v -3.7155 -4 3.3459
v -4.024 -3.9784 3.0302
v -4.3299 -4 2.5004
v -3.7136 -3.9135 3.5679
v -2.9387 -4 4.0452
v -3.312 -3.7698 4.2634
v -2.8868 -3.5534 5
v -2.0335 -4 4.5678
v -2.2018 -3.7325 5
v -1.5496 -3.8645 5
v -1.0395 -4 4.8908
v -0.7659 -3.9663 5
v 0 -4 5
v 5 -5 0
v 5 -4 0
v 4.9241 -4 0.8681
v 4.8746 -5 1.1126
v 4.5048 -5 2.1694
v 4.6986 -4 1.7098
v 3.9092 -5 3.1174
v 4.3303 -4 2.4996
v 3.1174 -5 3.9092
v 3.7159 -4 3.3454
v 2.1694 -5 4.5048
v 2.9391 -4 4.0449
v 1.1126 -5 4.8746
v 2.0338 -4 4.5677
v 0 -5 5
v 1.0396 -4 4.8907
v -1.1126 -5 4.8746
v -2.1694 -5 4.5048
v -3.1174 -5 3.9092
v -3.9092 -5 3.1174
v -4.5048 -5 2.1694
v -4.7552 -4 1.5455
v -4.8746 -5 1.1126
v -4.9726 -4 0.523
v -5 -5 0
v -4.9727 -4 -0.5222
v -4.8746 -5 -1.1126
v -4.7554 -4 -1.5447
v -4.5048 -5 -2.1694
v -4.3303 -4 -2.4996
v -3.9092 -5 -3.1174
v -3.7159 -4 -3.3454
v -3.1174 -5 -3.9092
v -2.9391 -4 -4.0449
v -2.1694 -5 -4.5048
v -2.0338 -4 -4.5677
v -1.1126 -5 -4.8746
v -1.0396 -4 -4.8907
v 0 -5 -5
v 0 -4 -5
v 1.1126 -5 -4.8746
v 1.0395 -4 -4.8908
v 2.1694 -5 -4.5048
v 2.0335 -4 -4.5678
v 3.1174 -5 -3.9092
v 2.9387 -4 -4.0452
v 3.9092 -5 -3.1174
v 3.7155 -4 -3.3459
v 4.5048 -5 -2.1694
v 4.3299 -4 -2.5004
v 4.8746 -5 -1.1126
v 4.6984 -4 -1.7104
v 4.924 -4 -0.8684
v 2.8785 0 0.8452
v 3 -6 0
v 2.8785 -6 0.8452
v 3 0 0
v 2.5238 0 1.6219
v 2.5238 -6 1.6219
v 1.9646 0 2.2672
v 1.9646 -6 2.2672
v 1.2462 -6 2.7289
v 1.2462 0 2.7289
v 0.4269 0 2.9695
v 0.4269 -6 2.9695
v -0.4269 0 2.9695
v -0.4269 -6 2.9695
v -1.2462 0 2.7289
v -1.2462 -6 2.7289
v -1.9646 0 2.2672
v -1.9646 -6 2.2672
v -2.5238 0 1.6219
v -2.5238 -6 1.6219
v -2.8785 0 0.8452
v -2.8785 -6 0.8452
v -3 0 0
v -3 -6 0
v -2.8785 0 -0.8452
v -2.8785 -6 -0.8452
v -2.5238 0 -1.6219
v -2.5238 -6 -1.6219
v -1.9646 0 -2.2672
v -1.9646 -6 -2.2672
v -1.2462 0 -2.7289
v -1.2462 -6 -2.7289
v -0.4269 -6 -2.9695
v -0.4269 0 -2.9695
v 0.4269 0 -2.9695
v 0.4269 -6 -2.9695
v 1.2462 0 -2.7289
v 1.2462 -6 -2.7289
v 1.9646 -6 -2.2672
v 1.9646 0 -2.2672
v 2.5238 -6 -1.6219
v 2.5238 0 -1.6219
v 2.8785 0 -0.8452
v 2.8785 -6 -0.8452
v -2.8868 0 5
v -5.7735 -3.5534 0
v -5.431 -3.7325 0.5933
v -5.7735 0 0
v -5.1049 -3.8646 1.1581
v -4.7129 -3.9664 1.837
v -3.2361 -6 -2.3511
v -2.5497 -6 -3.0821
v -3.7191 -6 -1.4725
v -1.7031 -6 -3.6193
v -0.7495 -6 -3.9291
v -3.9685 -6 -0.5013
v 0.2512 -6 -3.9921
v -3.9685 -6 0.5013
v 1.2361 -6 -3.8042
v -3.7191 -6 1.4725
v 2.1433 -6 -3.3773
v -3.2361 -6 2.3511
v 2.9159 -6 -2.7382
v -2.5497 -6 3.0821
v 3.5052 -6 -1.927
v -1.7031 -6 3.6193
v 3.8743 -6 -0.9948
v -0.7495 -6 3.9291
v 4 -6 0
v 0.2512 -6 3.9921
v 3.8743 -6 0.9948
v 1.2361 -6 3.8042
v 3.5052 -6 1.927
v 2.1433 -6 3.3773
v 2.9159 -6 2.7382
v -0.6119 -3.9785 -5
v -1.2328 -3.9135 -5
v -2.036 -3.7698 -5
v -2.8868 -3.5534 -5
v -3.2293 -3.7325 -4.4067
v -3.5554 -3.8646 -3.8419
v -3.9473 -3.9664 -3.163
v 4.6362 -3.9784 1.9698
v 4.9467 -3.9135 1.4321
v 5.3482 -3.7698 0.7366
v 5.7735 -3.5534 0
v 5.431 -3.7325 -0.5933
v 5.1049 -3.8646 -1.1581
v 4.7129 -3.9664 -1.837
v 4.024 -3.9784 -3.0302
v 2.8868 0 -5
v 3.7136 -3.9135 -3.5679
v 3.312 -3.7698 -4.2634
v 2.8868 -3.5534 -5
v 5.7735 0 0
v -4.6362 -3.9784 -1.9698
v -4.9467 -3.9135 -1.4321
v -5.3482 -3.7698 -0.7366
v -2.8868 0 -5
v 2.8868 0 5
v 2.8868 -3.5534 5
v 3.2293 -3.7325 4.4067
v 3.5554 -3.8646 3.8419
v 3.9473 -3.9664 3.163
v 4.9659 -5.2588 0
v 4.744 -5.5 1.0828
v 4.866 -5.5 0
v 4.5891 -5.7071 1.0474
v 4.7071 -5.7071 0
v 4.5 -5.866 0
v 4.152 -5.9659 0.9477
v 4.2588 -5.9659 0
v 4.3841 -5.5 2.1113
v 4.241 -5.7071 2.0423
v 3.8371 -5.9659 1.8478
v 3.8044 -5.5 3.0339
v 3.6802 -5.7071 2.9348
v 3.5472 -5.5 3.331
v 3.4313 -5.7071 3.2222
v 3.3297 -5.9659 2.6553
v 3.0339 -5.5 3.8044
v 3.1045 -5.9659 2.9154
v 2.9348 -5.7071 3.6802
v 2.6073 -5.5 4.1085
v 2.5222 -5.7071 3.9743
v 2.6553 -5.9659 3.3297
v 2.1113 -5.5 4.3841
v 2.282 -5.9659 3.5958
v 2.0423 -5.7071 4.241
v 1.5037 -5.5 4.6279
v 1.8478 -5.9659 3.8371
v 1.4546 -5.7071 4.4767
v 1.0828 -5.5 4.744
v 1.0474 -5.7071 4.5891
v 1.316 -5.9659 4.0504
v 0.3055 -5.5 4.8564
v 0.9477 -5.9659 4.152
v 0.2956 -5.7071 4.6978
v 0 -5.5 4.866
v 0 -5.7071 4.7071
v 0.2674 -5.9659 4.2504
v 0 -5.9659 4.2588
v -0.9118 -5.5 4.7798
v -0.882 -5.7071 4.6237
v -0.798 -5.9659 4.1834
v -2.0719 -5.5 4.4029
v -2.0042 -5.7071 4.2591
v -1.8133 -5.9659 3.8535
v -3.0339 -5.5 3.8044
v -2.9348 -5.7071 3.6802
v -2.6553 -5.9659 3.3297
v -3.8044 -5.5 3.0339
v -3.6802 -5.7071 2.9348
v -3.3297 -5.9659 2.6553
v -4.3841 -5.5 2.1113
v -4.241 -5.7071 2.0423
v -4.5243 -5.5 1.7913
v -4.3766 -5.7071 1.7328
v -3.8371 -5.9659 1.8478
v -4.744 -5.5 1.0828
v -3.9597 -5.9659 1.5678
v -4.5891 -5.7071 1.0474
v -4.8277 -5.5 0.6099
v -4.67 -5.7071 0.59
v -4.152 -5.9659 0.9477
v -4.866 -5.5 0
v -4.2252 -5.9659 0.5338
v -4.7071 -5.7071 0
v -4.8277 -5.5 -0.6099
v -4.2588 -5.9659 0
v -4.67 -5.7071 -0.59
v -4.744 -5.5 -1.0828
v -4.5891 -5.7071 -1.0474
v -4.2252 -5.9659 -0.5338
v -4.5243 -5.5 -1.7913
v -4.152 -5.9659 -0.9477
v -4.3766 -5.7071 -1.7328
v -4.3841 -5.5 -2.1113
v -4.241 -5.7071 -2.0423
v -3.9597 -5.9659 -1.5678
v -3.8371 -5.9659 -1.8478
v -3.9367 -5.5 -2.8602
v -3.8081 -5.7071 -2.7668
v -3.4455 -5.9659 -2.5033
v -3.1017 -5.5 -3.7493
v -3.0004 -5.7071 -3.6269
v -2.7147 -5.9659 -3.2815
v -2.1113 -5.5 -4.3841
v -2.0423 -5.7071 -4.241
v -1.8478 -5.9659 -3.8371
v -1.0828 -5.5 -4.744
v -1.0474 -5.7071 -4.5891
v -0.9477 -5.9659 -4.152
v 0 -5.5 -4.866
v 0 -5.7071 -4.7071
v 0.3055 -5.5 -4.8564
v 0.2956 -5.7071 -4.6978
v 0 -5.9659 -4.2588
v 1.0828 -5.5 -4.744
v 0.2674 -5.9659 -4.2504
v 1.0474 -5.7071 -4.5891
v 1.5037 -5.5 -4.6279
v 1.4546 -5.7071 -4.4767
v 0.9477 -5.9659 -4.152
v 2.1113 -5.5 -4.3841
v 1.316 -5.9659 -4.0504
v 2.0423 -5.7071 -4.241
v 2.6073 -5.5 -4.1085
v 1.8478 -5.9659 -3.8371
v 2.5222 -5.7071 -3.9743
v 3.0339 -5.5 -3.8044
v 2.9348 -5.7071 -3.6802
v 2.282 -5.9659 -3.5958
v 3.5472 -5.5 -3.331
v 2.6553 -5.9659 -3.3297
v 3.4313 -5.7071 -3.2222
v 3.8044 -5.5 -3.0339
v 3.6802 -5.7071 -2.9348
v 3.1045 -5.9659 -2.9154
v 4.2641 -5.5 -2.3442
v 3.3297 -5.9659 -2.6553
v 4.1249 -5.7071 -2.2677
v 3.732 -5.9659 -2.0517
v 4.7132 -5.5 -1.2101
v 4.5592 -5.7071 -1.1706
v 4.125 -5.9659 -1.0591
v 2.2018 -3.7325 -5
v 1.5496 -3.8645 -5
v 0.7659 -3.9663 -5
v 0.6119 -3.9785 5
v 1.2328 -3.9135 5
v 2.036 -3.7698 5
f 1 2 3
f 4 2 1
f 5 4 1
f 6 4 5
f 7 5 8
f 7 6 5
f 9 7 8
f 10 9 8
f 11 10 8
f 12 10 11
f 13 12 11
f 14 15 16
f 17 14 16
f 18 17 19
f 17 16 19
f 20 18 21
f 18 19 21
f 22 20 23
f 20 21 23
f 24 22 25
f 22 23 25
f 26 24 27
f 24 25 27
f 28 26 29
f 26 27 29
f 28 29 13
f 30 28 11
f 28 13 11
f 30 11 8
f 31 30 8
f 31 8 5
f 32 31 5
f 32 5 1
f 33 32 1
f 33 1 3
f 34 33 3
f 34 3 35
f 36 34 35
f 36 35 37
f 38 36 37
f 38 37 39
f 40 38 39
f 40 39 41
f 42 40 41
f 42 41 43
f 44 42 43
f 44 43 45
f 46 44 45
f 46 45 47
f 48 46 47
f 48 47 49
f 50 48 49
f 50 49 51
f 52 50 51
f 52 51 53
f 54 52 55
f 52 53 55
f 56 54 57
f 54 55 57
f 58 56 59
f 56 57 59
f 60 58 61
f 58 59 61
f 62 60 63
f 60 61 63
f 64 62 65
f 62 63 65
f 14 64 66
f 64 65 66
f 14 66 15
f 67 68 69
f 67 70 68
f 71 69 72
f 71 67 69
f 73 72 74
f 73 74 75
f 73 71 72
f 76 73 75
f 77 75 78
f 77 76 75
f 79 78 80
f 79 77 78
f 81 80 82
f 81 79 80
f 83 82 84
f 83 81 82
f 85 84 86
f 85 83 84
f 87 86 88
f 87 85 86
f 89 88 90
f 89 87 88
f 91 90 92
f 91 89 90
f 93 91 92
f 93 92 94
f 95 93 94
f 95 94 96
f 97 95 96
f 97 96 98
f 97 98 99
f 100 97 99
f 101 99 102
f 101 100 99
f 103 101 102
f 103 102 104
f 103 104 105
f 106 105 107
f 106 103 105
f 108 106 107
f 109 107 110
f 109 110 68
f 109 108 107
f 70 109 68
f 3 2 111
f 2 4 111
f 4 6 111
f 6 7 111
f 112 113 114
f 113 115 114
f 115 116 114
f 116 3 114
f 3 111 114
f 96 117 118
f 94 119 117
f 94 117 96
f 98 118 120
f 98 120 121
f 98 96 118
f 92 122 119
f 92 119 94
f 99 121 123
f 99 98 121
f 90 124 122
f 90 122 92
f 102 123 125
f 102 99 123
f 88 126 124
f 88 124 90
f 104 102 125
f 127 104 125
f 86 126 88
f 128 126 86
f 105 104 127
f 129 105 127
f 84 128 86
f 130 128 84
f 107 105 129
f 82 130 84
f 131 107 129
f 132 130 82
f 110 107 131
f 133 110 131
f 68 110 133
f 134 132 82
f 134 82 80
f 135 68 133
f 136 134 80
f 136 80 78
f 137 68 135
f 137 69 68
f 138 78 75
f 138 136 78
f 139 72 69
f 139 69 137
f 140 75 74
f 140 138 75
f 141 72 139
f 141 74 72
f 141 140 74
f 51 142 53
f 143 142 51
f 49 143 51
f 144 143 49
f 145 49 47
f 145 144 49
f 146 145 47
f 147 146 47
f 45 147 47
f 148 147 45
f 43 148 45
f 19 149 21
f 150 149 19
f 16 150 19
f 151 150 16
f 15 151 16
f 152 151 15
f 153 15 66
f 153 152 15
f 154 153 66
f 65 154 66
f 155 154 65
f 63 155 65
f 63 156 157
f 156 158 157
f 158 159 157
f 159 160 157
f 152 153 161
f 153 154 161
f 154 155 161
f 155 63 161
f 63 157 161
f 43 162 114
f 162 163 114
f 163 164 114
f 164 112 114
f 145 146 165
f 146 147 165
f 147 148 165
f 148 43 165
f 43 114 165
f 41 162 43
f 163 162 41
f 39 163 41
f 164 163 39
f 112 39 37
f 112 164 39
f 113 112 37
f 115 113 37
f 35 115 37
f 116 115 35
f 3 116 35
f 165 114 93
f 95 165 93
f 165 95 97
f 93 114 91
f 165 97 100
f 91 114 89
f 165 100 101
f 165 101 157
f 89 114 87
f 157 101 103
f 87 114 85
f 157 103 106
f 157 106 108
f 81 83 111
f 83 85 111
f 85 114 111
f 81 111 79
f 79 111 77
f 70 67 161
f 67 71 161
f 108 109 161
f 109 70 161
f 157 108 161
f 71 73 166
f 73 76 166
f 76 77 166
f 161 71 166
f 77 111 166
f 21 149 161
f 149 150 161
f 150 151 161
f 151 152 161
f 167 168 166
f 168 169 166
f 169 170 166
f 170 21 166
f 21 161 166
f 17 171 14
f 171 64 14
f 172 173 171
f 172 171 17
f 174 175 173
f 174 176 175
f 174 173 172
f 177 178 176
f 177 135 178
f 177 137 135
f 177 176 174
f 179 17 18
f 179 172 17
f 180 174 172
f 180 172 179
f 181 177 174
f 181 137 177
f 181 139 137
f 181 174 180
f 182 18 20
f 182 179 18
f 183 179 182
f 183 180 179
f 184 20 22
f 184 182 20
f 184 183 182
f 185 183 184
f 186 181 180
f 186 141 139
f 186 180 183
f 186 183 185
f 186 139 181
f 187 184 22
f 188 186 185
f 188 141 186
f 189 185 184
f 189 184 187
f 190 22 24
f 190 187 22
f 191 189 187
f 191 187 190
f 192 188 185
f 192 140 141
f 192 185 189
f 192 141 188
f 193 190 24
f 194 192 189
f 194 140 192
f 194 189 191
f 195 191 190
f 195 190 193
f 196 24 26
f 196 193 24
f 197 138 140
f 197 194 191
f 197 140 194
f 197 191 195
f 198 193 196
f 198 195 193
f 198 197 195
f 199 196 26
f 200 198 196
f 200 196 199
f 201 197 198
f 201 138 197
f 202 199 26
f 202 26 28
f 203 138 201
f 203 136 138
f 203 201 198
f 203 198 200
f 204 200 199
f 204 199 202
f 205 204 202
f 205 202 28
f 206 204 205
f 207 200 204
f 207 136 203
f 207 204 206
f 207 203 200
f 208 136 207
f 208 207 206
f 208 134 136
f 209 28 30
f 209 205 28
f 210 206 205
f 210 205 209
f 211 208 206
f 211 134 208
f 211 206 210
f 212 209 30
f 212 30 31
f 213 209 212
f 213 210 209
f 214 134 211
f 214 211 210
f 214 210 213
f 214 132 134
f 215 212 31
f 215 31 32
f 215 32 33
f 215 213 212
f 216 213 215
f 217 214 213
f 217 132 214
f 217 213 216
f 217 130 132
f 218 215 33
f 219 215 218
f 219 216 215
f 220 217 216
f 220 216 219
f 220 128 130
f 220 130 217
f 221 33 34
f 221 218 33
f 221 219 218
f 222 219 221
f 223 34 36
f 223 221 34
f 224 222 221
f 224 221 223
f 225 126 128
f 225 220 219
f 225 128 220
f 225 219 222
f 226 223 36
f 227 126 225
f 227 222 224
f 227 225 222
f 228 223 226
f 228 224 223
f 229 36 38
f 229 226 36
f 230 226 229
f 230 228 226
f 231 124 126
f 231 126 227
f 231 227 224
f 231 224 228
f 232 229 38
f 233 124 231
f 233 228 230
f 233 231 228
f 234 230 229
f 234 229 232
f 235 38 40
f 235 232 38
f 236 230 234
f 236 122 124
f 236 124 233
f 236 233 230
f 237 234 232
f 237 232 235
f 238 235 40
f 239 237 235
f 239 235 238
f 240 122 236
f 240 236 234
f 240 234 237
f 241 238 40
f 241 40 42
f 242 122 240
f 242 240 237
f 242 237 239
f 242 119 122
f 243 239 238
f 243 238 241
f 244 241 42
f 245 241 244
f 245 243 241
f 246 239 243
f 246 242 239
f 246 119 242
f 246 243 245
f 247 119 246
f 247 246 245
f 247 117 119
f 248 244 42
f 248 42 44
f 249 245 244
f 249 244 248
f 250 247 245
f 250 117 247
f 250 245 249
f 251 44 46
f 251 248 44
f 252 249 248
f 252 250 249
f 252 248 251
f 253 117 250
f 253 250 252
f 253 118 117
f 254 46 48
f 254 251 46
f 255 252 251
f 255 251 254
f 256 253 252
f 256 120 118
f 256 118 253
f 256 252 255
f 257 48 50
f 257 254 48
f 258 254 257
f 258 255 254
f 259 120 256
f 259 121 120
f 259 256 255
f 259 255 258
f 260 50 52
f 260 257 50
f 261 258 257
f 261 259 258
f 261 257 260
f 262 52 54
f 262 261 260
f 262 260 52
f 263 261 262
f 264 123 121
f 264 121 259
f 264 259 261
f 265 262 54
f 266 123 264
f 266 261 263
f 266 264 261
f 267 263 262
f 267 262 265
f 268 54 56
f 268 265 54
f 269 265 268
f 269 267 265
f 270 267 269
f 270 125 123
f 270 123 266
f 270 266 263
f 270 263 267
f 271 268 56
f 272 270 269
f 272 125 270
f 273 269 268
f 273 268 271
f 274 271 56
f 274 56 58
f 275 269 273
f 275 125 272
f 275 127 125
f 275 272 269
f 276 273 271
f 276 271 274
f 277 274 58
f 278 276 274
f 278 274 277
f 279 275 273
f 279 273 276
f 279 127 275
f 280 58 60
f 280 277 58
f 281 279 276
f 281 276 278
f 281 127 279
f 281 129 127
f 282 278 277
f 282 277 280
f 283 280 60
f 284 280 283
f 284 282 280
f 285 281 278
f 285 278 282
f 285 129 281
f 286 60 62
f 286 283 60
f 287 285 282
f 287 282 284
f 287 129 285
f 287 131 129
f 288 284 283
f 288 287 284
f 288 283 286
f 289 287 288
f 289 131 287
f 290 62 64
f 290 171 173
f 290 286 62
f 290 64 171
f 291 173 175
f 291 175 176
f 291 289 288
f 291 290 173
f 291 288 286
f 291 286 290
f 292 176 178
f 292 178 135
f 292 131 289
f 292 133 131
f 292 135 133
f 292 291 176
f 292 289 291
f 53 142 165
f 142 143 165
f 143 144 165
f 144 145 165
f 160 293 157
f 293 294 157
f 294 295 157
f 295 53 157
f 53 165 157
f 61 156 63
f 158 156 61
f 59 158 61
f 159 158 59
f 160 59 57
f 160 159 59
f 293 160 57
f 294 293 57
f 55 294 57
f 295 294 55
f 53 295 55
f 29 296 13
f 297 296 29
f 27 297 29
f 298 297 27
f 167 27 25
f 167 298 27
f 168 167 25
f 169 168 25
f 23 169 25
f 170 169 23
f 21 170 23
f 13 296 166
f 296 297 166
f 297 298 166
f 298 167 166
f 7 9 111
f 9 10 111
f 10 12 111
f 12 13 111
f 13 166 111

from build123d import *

# Parameters (mm, degrees)
F0_R     = 3
F1_DEPTH = 4
F4_R     = 5
F4_R_2   = 3
F5_DEPTH = 2
F6_R     = 1


with BuildPart() as f1:
    # F0 (on Front) → F1 (new body)
    with BuildSketch(Plane.XZ):
        Polygon((2.886751, -5), (5.773503, 0), (2.886751, 5), (-2.886751, 5), (-5.773503, 0), (-2.886751, -5), align=None)
        Circle(F0_R, mode=Mode.SUBTRACT)
    extrude(amount=F1_DEPTH)

    # F2 (on Right) → F3 (revolve, cut)
    with BuildSketch(Plane.YZ):
        Polygon((-5.443376, 7.5), (-5.443376, 2.5), (-2.556624, 7.5), align=None)
    revolve(axis=Axis((0, 0, 0), (0, 1, 0)), mode=Mode.SUBTRACT)

    # F4 (on face) → F5 (join)
    with BuildSketch(Plane.XZ.offset(4)):
        Circle(F4_R)
        Circle(F4_R_2, mode=Mode.SUBTRACT)
    extrude(amount=F5_DEPTH)

    # F6
    f6_edges = [f1.edges().sort_by_distance(p)[0] for p in [
        (-5, -6, 0),
    ]]
    fillet(f6_edges, radius=F6_R)


solid = f1.part
